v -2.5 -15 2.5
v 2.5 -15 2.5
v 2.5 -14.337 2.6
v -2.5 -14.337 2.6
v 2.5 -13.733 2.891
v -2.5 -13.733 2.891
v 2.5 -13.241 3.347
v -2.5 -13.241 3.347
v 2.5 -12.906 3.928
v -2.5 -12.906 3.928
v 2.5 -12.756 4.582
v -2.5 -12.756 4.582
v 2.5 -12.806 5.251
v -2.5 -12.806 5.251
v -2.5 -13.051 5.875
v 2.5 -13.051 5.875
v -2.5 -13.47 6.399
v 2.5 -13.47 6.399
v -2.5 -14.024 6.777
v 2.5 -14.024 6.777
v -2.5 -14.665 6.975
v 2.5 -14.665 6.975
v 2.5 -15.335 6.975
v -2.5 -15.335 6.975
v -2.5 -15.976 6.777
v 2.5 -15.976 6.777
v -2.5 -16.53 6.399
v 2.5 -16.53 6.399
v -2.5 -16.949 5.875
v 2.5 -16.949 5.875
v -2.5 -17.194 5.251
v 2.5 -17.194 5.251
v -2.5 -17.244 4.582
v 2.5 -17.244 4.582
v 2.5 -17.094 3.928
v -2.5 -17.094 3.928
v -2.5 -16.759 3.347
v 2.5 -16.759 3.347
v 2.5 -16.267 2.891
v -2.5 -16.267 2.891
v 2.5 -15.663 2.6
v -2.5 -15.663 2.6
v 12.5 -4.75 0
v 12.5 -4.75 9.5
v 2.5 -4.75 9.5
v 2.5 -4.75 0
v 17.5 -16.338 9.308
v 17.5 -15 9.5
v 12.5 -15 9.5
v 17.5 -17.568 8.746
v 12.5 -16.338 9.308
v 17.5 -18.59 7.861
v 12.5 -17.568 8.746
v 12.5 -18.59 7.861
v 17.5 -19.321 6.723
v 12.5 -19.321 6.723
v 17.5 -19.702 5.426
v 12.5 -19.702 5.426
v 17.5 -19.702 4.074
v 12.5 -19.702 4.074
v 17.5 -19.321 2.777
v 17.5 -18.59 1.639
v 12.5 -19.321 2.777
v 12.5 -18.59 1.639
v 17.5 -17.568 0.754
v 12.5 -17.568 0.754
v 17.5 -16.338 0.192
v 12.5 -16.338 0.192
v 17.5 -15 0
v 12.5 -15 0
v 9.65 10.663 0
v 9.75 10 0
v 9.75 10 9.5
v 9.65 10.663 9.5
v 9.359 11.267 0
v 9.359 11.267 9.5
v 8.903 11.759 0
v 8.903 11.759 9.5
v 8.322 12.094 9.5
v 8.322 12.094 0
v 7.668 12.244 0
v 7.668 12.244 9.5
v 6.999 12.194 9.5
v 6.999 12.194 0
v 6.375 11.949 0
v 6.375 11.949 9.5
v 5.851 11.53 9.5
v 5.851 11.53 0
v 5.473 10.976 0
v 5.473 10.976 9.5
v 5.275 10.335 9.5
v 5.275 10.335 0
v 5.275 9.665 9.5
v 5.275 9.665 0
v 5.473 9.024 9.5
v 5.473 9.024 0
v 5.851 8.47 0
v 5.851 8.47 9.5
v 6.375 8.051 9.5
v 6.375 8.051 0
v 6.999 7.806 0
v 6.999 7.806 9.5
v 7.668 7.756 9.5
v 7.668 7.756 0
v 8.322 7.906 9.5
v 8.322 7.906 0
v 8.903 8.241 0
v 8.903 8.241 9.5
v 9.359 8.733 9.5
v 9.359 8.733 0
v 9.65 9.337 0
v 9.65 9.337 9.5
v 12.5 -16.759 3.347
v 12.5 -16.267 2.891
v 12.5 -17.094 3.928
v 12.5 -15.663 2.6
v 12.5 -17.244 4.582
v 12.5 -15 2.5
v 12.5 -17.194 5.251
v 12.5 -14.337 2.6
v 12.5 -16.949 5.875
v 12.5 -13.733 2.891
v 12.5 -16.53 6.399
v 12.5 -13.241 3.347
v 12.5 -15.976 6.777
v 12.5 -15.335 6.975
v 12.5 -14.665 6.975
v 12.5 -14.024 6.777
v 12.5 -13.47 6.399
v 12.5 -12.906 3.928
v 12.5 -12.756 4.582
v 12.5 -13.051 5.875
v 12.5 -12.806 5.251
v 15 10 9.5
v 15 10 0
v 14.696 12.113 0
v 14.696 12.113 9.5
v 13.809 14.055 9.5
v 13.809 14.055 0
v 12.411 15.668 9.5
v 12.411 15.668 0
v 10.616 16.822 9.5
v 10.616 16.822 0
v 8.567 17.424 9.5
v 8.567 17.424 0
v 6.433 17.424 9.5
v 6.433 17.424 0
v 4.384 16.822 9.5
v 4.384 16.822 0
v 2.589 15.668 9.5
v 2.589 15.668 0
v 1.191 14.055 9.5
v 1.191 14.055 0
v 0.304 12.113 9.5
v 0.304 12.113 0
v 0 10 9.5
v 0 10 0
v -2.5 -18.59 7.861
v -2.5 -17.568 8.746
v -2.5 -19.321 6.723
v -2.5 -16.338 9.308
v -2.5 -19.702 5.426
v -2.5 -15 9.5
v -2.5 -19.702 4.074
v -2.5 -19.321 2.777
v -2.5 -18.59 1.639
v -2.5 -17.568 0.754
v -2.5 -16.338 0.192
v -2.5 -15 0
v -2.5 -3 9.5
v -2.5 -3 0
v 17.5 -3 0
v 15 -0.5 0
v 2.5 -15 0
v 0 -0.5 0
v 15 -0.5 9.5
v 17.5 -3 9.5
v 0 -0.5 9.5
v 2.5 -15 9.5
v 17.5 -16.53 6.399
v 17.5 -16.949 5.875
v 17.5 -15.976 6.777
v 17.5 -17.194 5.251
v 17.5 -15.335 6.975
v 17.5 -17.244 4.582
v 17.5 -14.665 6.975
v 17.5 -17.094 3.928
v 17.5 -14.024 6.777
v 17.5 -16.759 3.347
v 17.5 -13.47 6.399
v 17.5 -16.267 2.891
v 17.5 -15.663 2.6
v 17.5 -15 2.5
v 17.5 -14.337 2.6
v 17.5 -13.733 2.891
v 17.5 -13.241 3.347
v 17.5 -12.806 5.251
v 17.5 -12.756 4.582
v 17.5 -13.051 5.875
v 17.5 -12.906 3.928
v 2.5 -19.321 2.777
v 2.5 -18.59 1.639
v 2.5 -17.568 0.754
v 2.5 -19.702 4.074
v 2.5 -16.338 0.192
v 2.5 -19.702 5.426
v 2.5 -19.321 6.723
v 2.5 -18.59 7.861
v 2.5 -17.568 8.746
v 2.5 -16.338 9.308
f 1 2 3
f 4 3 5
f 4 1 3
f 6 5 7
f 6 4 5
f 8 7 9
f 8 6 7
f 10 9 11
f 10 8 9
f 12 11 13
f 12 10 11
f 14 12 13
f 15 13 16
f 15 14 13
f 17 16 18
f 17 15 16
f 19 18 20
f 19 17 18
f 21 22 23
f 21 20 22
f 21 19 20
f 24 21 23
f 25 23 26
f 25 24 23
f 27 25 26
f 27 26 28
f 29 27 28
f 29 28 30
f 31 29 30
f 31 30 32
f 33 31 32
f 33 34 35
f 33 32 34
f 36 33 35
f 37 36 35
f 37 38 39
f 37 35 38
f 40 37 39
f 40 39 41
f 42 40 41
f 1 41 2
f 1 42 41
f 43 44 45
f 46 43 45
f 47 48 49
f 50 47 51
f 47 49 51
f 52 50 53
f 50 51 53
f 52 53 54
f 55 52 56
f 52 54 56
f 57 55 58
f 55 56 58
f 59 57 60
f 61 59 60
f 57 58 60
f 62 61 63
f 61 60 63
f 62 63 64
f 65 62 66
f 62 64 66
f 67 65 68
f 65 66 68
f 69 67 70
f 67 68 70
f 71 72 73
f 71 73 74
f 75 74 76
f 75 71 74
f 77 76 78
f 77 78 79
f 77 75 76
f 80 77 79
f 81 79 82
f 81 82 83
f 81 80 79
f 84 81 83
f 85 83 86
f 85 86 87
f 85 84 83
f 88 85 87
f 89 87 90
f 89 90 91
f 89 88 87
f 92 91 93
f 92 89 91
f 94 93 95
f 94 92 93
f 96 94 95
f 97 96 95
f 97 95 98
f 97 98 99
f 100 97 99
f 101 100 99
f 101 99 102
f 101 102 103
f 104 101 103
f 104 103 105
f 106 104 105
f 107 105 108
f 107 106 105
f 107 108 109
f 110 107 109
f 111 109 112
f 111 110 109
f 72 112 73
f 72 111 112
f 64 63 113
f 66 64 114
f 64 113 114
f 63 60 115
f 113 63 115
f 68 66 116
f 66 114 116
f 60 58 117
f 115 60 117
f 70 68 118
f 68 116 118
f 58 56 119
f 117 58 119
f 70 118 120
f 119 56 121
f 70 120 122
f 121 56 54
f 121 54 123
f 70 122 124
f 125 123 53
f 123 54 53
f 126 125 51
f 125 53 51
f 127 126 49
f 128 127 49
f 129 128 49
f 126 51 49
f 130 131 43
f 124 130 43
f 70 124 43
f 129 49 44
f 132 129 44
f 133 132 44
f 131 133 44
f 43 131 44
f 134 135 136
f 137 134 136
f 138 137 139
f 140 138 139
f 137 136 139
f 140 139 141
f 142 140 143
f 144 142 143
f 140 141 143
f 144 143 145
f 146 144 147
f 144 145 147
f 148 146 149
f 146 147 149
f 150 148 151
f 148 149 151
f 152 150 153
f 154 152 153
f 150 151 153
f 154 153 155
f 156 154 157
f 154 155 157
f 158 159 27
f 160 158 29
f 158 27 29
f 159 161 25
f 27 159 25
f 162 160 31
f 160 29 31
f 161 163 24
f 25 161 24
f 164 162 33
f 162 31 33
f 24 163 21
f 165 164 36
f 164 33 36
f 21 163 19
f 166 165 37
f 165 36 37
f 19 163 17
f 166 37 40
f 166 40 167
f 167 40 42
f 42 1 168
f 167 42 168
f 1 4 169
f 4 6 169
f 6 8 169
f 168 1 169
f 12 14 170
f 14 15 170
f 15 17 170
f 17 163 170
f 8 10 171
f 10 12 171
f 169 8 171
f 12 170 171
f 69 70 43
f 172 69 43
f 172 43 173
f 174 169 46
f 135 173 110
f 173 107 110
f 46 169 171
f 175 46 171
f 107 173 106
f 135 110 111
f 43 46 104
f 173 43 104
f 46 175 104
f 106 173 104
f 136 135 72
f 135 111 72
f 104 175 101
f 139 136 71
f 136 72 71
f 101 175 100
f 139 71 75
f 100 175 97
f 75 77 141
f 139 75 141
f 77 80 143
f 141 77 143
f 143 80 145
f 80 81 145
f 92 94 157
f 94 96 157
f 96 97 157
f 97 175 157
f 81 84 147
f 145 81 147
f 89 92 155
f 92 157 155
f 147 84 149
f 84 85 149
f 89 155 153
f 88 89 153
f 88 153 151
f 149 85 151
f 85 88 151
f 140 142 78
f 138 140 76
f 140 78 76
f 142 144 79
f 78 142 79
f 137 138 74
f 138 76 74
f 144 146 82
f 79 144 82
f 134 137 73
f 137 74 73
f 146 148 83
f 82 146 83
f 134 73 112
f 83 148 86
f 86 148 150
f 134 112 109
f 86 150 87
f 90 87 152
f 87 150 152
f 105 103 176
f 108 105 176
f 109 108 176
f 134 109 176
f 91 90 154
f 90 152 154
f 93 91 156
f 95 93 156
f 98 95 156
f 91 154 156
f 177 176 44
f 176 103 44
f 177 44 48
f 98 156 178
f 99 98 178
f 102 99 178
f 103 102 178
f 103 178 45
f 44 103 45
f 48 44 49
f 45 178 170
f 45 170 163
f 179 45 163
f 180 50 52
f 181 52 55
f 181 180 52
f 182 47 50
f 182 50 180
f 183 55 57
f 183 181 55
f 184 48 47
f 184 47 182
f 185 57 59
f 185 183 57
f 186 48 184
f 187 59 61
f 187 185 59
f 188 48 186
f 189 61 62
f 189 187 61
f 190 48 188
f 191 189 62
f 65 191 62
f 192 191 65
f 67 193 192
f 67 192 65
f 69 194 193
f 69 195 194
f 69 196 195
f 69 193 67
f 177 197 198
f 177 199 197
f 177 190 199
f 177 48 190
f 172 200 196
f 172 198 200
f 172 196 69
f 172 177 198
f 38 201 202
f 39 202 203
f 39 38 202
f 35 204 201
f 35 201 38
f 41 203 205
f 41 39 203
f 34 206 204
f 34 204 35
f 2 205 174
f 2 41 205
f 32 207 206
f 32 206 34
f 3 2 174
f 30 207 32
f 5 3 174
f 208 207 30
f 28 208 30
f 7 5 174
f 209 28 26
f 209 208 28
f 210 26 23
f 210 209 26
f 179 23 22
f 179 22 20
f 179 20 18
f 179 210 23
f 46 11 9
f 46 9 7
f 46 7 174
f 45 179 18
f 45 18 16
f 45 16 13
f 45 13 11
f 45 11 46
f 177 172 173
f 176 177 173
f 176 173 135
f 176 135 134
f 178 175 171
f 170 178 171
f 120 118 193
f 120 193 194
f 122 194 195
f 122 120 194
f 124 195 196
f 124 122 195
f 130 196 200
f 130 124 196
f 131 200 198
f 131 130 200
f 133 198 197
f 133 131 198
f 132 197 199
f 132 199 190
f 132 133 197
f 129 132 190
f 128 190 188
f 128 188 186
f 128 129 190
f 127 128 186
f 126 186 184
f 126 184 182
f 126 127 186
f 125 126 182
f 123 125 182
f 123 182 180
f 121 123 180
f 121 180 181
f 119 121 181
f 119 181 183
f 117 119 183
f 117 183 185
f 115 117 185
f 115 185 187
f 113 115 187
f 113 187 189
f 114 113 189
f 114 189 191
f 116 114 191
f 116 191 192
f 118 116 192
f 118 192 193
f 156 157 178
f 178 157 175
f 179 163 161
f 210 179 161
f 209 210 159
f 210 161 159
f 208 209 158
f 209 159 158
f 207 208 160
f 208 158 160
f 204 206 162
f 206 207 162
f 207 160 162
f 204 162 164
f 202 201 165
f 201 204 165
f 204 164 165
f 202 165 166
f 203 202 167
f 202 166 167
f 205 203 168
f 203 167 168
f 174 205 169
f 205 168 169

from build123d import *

# Parameters (mm, degrees)
SKETCH1_R                = 2.25
BOSS_EXTRUDE1_DEPTH      = 9.5
BOSS_EXTRUDE2_DEPTH      = 10
BOSS_EXTRUDE2_DEPTH_BACK = 10
SKETCH2_R                = 2.25
SKETCH4_W                = 10
SKETCH4_H                = 15
CUT_EXTRUDE1_DEPTH       = 25.986246217
CHAMFER1_SIZE            = 3


with BuildPart() as part:
    # Sketch1 → Boss-Extrude1 (new body)
    with BuildSketch(Plane.XY):
        with BuildLine():
            Line((0, 0), (15, 0))
            Line((15, 0), (15, 10))
            ThreePointArc((15, 10), (7.5, 17.5), (0, 10))
            Line((0, 10), (0, 0))
        make_face()
        with Locations((7.5, 10)):
            Circle(SKETCH1_R, mode=Mode.SUBTRACT)
    extrude(amount=BOSS_EXTRUDE1_DEPTH)

    # Sketch2 → Boss-Extrude2 (add, two sides: drawn at the far end of the back side and taken through both)
    with BuildSketch(Plane(origin=(7.5, 0, 0), x_dir=(0, 0, -1), z_dir=(1, 0, 0)).offset(-BOSS_EXTRUDE2_DEPTH_BACK)):
        with BuildLine():
            Line((-9.5, 0), (-9.5, -15))
            ThreePointArc((-9.5, -15), (-4.75, -19.75), (0, -15))
            Line((0, -15), (0, 0))
            Line((0, 0), (-9.5, 0))
        make_face()
        with Locations((-4.75, -15)):
            Circle(SKETCH2_R, mode=Mode.SUBTRACT)
    extrude(amount=BOSS_EXTRUDE2_DEPTH + BOSS_EXTRUDE2_DEPTH_BACK)

    # Sketch4 → Cut-Extrude1 (cut, through all)
    with BuildSketch(Plane(origin=(5.5, 0, 9.5), x_dir=(-1, 0, 0), z_dir=(0, 0, -1))):
        with Locations((-2, -12.25)):
            Rectangle(SKETCH4_W, SKETCH4_H)
    extrude(amount=CUT_EXTRUDE1_DEPTH, mode=Mode.SUBTRACT)

    # Chamfer1
    # the kernel refuses this chamfer: 3 mm, written as the material it takes off along each edge
    with BuildSketch(Plane(origin=(-2.5, 0, -7.715048964), x_dir=(0.9996219169112968, 0.027495876610586372, 0), z_dir=(0, 0, 1))) as chamfer1_piece_1_section:
        Polygon((CHAMFER1_SIZE * 0.999621916911, -CHAMFER1_SIZE * 0.0274958766106), (-CHAMFER1_SIZE * 0.0274958766106, -CHAMFER1_SIZE * 0.999621916911), (0, 0), align=None)
    chamfer1_piece_1 = extrude(amount=24.930097928, mode=Mode.PRIVATE)
    chamfer1_piece_1 = split(chamfer1_piece_1, bisect_by=Plane(origin=(0, -1.026079574, 4.75), z_dir=(-1, 0, 0)), keep=Keep.TOP, mode=Mode.PRIVATE)
    add(chamfer1_piece_1, mode=Mode.SUBTRACT)
    with BuildSketch(Plane(origin=(17.5, 0, -7.715048964), x_dir=(0.027495876610586778, -0.9996219169112968, 0), z_dir=(0, 0, 1))) as chamfer1_piece_2_section:
        Polygon((CHAMFER1_SIZE * 0.999621916911, -CHAMFER1_SIZE * 0.0274958766106), (-CHAMFER1_SIZE * 0.0274958766106, -CHAMFER1_SIZE * 0.999621916911), (0, 0), align=None)
    chamfer1_piece_2 = extrude(amount=24.930097928, mode=Mode.PRIVATE)
    chamfer1_piece_2 = split(chamfer1_piece_2, bisect_by=Plane(origin=(15, -1.026079574, 4.75), z_dir=(1, 0, 0)), keep=Keep.TOP, mode=Mode.PRIVATE)
    add(chamfer1_piece_2, mode=Mode.SUBTRACT)


solid = part.part
